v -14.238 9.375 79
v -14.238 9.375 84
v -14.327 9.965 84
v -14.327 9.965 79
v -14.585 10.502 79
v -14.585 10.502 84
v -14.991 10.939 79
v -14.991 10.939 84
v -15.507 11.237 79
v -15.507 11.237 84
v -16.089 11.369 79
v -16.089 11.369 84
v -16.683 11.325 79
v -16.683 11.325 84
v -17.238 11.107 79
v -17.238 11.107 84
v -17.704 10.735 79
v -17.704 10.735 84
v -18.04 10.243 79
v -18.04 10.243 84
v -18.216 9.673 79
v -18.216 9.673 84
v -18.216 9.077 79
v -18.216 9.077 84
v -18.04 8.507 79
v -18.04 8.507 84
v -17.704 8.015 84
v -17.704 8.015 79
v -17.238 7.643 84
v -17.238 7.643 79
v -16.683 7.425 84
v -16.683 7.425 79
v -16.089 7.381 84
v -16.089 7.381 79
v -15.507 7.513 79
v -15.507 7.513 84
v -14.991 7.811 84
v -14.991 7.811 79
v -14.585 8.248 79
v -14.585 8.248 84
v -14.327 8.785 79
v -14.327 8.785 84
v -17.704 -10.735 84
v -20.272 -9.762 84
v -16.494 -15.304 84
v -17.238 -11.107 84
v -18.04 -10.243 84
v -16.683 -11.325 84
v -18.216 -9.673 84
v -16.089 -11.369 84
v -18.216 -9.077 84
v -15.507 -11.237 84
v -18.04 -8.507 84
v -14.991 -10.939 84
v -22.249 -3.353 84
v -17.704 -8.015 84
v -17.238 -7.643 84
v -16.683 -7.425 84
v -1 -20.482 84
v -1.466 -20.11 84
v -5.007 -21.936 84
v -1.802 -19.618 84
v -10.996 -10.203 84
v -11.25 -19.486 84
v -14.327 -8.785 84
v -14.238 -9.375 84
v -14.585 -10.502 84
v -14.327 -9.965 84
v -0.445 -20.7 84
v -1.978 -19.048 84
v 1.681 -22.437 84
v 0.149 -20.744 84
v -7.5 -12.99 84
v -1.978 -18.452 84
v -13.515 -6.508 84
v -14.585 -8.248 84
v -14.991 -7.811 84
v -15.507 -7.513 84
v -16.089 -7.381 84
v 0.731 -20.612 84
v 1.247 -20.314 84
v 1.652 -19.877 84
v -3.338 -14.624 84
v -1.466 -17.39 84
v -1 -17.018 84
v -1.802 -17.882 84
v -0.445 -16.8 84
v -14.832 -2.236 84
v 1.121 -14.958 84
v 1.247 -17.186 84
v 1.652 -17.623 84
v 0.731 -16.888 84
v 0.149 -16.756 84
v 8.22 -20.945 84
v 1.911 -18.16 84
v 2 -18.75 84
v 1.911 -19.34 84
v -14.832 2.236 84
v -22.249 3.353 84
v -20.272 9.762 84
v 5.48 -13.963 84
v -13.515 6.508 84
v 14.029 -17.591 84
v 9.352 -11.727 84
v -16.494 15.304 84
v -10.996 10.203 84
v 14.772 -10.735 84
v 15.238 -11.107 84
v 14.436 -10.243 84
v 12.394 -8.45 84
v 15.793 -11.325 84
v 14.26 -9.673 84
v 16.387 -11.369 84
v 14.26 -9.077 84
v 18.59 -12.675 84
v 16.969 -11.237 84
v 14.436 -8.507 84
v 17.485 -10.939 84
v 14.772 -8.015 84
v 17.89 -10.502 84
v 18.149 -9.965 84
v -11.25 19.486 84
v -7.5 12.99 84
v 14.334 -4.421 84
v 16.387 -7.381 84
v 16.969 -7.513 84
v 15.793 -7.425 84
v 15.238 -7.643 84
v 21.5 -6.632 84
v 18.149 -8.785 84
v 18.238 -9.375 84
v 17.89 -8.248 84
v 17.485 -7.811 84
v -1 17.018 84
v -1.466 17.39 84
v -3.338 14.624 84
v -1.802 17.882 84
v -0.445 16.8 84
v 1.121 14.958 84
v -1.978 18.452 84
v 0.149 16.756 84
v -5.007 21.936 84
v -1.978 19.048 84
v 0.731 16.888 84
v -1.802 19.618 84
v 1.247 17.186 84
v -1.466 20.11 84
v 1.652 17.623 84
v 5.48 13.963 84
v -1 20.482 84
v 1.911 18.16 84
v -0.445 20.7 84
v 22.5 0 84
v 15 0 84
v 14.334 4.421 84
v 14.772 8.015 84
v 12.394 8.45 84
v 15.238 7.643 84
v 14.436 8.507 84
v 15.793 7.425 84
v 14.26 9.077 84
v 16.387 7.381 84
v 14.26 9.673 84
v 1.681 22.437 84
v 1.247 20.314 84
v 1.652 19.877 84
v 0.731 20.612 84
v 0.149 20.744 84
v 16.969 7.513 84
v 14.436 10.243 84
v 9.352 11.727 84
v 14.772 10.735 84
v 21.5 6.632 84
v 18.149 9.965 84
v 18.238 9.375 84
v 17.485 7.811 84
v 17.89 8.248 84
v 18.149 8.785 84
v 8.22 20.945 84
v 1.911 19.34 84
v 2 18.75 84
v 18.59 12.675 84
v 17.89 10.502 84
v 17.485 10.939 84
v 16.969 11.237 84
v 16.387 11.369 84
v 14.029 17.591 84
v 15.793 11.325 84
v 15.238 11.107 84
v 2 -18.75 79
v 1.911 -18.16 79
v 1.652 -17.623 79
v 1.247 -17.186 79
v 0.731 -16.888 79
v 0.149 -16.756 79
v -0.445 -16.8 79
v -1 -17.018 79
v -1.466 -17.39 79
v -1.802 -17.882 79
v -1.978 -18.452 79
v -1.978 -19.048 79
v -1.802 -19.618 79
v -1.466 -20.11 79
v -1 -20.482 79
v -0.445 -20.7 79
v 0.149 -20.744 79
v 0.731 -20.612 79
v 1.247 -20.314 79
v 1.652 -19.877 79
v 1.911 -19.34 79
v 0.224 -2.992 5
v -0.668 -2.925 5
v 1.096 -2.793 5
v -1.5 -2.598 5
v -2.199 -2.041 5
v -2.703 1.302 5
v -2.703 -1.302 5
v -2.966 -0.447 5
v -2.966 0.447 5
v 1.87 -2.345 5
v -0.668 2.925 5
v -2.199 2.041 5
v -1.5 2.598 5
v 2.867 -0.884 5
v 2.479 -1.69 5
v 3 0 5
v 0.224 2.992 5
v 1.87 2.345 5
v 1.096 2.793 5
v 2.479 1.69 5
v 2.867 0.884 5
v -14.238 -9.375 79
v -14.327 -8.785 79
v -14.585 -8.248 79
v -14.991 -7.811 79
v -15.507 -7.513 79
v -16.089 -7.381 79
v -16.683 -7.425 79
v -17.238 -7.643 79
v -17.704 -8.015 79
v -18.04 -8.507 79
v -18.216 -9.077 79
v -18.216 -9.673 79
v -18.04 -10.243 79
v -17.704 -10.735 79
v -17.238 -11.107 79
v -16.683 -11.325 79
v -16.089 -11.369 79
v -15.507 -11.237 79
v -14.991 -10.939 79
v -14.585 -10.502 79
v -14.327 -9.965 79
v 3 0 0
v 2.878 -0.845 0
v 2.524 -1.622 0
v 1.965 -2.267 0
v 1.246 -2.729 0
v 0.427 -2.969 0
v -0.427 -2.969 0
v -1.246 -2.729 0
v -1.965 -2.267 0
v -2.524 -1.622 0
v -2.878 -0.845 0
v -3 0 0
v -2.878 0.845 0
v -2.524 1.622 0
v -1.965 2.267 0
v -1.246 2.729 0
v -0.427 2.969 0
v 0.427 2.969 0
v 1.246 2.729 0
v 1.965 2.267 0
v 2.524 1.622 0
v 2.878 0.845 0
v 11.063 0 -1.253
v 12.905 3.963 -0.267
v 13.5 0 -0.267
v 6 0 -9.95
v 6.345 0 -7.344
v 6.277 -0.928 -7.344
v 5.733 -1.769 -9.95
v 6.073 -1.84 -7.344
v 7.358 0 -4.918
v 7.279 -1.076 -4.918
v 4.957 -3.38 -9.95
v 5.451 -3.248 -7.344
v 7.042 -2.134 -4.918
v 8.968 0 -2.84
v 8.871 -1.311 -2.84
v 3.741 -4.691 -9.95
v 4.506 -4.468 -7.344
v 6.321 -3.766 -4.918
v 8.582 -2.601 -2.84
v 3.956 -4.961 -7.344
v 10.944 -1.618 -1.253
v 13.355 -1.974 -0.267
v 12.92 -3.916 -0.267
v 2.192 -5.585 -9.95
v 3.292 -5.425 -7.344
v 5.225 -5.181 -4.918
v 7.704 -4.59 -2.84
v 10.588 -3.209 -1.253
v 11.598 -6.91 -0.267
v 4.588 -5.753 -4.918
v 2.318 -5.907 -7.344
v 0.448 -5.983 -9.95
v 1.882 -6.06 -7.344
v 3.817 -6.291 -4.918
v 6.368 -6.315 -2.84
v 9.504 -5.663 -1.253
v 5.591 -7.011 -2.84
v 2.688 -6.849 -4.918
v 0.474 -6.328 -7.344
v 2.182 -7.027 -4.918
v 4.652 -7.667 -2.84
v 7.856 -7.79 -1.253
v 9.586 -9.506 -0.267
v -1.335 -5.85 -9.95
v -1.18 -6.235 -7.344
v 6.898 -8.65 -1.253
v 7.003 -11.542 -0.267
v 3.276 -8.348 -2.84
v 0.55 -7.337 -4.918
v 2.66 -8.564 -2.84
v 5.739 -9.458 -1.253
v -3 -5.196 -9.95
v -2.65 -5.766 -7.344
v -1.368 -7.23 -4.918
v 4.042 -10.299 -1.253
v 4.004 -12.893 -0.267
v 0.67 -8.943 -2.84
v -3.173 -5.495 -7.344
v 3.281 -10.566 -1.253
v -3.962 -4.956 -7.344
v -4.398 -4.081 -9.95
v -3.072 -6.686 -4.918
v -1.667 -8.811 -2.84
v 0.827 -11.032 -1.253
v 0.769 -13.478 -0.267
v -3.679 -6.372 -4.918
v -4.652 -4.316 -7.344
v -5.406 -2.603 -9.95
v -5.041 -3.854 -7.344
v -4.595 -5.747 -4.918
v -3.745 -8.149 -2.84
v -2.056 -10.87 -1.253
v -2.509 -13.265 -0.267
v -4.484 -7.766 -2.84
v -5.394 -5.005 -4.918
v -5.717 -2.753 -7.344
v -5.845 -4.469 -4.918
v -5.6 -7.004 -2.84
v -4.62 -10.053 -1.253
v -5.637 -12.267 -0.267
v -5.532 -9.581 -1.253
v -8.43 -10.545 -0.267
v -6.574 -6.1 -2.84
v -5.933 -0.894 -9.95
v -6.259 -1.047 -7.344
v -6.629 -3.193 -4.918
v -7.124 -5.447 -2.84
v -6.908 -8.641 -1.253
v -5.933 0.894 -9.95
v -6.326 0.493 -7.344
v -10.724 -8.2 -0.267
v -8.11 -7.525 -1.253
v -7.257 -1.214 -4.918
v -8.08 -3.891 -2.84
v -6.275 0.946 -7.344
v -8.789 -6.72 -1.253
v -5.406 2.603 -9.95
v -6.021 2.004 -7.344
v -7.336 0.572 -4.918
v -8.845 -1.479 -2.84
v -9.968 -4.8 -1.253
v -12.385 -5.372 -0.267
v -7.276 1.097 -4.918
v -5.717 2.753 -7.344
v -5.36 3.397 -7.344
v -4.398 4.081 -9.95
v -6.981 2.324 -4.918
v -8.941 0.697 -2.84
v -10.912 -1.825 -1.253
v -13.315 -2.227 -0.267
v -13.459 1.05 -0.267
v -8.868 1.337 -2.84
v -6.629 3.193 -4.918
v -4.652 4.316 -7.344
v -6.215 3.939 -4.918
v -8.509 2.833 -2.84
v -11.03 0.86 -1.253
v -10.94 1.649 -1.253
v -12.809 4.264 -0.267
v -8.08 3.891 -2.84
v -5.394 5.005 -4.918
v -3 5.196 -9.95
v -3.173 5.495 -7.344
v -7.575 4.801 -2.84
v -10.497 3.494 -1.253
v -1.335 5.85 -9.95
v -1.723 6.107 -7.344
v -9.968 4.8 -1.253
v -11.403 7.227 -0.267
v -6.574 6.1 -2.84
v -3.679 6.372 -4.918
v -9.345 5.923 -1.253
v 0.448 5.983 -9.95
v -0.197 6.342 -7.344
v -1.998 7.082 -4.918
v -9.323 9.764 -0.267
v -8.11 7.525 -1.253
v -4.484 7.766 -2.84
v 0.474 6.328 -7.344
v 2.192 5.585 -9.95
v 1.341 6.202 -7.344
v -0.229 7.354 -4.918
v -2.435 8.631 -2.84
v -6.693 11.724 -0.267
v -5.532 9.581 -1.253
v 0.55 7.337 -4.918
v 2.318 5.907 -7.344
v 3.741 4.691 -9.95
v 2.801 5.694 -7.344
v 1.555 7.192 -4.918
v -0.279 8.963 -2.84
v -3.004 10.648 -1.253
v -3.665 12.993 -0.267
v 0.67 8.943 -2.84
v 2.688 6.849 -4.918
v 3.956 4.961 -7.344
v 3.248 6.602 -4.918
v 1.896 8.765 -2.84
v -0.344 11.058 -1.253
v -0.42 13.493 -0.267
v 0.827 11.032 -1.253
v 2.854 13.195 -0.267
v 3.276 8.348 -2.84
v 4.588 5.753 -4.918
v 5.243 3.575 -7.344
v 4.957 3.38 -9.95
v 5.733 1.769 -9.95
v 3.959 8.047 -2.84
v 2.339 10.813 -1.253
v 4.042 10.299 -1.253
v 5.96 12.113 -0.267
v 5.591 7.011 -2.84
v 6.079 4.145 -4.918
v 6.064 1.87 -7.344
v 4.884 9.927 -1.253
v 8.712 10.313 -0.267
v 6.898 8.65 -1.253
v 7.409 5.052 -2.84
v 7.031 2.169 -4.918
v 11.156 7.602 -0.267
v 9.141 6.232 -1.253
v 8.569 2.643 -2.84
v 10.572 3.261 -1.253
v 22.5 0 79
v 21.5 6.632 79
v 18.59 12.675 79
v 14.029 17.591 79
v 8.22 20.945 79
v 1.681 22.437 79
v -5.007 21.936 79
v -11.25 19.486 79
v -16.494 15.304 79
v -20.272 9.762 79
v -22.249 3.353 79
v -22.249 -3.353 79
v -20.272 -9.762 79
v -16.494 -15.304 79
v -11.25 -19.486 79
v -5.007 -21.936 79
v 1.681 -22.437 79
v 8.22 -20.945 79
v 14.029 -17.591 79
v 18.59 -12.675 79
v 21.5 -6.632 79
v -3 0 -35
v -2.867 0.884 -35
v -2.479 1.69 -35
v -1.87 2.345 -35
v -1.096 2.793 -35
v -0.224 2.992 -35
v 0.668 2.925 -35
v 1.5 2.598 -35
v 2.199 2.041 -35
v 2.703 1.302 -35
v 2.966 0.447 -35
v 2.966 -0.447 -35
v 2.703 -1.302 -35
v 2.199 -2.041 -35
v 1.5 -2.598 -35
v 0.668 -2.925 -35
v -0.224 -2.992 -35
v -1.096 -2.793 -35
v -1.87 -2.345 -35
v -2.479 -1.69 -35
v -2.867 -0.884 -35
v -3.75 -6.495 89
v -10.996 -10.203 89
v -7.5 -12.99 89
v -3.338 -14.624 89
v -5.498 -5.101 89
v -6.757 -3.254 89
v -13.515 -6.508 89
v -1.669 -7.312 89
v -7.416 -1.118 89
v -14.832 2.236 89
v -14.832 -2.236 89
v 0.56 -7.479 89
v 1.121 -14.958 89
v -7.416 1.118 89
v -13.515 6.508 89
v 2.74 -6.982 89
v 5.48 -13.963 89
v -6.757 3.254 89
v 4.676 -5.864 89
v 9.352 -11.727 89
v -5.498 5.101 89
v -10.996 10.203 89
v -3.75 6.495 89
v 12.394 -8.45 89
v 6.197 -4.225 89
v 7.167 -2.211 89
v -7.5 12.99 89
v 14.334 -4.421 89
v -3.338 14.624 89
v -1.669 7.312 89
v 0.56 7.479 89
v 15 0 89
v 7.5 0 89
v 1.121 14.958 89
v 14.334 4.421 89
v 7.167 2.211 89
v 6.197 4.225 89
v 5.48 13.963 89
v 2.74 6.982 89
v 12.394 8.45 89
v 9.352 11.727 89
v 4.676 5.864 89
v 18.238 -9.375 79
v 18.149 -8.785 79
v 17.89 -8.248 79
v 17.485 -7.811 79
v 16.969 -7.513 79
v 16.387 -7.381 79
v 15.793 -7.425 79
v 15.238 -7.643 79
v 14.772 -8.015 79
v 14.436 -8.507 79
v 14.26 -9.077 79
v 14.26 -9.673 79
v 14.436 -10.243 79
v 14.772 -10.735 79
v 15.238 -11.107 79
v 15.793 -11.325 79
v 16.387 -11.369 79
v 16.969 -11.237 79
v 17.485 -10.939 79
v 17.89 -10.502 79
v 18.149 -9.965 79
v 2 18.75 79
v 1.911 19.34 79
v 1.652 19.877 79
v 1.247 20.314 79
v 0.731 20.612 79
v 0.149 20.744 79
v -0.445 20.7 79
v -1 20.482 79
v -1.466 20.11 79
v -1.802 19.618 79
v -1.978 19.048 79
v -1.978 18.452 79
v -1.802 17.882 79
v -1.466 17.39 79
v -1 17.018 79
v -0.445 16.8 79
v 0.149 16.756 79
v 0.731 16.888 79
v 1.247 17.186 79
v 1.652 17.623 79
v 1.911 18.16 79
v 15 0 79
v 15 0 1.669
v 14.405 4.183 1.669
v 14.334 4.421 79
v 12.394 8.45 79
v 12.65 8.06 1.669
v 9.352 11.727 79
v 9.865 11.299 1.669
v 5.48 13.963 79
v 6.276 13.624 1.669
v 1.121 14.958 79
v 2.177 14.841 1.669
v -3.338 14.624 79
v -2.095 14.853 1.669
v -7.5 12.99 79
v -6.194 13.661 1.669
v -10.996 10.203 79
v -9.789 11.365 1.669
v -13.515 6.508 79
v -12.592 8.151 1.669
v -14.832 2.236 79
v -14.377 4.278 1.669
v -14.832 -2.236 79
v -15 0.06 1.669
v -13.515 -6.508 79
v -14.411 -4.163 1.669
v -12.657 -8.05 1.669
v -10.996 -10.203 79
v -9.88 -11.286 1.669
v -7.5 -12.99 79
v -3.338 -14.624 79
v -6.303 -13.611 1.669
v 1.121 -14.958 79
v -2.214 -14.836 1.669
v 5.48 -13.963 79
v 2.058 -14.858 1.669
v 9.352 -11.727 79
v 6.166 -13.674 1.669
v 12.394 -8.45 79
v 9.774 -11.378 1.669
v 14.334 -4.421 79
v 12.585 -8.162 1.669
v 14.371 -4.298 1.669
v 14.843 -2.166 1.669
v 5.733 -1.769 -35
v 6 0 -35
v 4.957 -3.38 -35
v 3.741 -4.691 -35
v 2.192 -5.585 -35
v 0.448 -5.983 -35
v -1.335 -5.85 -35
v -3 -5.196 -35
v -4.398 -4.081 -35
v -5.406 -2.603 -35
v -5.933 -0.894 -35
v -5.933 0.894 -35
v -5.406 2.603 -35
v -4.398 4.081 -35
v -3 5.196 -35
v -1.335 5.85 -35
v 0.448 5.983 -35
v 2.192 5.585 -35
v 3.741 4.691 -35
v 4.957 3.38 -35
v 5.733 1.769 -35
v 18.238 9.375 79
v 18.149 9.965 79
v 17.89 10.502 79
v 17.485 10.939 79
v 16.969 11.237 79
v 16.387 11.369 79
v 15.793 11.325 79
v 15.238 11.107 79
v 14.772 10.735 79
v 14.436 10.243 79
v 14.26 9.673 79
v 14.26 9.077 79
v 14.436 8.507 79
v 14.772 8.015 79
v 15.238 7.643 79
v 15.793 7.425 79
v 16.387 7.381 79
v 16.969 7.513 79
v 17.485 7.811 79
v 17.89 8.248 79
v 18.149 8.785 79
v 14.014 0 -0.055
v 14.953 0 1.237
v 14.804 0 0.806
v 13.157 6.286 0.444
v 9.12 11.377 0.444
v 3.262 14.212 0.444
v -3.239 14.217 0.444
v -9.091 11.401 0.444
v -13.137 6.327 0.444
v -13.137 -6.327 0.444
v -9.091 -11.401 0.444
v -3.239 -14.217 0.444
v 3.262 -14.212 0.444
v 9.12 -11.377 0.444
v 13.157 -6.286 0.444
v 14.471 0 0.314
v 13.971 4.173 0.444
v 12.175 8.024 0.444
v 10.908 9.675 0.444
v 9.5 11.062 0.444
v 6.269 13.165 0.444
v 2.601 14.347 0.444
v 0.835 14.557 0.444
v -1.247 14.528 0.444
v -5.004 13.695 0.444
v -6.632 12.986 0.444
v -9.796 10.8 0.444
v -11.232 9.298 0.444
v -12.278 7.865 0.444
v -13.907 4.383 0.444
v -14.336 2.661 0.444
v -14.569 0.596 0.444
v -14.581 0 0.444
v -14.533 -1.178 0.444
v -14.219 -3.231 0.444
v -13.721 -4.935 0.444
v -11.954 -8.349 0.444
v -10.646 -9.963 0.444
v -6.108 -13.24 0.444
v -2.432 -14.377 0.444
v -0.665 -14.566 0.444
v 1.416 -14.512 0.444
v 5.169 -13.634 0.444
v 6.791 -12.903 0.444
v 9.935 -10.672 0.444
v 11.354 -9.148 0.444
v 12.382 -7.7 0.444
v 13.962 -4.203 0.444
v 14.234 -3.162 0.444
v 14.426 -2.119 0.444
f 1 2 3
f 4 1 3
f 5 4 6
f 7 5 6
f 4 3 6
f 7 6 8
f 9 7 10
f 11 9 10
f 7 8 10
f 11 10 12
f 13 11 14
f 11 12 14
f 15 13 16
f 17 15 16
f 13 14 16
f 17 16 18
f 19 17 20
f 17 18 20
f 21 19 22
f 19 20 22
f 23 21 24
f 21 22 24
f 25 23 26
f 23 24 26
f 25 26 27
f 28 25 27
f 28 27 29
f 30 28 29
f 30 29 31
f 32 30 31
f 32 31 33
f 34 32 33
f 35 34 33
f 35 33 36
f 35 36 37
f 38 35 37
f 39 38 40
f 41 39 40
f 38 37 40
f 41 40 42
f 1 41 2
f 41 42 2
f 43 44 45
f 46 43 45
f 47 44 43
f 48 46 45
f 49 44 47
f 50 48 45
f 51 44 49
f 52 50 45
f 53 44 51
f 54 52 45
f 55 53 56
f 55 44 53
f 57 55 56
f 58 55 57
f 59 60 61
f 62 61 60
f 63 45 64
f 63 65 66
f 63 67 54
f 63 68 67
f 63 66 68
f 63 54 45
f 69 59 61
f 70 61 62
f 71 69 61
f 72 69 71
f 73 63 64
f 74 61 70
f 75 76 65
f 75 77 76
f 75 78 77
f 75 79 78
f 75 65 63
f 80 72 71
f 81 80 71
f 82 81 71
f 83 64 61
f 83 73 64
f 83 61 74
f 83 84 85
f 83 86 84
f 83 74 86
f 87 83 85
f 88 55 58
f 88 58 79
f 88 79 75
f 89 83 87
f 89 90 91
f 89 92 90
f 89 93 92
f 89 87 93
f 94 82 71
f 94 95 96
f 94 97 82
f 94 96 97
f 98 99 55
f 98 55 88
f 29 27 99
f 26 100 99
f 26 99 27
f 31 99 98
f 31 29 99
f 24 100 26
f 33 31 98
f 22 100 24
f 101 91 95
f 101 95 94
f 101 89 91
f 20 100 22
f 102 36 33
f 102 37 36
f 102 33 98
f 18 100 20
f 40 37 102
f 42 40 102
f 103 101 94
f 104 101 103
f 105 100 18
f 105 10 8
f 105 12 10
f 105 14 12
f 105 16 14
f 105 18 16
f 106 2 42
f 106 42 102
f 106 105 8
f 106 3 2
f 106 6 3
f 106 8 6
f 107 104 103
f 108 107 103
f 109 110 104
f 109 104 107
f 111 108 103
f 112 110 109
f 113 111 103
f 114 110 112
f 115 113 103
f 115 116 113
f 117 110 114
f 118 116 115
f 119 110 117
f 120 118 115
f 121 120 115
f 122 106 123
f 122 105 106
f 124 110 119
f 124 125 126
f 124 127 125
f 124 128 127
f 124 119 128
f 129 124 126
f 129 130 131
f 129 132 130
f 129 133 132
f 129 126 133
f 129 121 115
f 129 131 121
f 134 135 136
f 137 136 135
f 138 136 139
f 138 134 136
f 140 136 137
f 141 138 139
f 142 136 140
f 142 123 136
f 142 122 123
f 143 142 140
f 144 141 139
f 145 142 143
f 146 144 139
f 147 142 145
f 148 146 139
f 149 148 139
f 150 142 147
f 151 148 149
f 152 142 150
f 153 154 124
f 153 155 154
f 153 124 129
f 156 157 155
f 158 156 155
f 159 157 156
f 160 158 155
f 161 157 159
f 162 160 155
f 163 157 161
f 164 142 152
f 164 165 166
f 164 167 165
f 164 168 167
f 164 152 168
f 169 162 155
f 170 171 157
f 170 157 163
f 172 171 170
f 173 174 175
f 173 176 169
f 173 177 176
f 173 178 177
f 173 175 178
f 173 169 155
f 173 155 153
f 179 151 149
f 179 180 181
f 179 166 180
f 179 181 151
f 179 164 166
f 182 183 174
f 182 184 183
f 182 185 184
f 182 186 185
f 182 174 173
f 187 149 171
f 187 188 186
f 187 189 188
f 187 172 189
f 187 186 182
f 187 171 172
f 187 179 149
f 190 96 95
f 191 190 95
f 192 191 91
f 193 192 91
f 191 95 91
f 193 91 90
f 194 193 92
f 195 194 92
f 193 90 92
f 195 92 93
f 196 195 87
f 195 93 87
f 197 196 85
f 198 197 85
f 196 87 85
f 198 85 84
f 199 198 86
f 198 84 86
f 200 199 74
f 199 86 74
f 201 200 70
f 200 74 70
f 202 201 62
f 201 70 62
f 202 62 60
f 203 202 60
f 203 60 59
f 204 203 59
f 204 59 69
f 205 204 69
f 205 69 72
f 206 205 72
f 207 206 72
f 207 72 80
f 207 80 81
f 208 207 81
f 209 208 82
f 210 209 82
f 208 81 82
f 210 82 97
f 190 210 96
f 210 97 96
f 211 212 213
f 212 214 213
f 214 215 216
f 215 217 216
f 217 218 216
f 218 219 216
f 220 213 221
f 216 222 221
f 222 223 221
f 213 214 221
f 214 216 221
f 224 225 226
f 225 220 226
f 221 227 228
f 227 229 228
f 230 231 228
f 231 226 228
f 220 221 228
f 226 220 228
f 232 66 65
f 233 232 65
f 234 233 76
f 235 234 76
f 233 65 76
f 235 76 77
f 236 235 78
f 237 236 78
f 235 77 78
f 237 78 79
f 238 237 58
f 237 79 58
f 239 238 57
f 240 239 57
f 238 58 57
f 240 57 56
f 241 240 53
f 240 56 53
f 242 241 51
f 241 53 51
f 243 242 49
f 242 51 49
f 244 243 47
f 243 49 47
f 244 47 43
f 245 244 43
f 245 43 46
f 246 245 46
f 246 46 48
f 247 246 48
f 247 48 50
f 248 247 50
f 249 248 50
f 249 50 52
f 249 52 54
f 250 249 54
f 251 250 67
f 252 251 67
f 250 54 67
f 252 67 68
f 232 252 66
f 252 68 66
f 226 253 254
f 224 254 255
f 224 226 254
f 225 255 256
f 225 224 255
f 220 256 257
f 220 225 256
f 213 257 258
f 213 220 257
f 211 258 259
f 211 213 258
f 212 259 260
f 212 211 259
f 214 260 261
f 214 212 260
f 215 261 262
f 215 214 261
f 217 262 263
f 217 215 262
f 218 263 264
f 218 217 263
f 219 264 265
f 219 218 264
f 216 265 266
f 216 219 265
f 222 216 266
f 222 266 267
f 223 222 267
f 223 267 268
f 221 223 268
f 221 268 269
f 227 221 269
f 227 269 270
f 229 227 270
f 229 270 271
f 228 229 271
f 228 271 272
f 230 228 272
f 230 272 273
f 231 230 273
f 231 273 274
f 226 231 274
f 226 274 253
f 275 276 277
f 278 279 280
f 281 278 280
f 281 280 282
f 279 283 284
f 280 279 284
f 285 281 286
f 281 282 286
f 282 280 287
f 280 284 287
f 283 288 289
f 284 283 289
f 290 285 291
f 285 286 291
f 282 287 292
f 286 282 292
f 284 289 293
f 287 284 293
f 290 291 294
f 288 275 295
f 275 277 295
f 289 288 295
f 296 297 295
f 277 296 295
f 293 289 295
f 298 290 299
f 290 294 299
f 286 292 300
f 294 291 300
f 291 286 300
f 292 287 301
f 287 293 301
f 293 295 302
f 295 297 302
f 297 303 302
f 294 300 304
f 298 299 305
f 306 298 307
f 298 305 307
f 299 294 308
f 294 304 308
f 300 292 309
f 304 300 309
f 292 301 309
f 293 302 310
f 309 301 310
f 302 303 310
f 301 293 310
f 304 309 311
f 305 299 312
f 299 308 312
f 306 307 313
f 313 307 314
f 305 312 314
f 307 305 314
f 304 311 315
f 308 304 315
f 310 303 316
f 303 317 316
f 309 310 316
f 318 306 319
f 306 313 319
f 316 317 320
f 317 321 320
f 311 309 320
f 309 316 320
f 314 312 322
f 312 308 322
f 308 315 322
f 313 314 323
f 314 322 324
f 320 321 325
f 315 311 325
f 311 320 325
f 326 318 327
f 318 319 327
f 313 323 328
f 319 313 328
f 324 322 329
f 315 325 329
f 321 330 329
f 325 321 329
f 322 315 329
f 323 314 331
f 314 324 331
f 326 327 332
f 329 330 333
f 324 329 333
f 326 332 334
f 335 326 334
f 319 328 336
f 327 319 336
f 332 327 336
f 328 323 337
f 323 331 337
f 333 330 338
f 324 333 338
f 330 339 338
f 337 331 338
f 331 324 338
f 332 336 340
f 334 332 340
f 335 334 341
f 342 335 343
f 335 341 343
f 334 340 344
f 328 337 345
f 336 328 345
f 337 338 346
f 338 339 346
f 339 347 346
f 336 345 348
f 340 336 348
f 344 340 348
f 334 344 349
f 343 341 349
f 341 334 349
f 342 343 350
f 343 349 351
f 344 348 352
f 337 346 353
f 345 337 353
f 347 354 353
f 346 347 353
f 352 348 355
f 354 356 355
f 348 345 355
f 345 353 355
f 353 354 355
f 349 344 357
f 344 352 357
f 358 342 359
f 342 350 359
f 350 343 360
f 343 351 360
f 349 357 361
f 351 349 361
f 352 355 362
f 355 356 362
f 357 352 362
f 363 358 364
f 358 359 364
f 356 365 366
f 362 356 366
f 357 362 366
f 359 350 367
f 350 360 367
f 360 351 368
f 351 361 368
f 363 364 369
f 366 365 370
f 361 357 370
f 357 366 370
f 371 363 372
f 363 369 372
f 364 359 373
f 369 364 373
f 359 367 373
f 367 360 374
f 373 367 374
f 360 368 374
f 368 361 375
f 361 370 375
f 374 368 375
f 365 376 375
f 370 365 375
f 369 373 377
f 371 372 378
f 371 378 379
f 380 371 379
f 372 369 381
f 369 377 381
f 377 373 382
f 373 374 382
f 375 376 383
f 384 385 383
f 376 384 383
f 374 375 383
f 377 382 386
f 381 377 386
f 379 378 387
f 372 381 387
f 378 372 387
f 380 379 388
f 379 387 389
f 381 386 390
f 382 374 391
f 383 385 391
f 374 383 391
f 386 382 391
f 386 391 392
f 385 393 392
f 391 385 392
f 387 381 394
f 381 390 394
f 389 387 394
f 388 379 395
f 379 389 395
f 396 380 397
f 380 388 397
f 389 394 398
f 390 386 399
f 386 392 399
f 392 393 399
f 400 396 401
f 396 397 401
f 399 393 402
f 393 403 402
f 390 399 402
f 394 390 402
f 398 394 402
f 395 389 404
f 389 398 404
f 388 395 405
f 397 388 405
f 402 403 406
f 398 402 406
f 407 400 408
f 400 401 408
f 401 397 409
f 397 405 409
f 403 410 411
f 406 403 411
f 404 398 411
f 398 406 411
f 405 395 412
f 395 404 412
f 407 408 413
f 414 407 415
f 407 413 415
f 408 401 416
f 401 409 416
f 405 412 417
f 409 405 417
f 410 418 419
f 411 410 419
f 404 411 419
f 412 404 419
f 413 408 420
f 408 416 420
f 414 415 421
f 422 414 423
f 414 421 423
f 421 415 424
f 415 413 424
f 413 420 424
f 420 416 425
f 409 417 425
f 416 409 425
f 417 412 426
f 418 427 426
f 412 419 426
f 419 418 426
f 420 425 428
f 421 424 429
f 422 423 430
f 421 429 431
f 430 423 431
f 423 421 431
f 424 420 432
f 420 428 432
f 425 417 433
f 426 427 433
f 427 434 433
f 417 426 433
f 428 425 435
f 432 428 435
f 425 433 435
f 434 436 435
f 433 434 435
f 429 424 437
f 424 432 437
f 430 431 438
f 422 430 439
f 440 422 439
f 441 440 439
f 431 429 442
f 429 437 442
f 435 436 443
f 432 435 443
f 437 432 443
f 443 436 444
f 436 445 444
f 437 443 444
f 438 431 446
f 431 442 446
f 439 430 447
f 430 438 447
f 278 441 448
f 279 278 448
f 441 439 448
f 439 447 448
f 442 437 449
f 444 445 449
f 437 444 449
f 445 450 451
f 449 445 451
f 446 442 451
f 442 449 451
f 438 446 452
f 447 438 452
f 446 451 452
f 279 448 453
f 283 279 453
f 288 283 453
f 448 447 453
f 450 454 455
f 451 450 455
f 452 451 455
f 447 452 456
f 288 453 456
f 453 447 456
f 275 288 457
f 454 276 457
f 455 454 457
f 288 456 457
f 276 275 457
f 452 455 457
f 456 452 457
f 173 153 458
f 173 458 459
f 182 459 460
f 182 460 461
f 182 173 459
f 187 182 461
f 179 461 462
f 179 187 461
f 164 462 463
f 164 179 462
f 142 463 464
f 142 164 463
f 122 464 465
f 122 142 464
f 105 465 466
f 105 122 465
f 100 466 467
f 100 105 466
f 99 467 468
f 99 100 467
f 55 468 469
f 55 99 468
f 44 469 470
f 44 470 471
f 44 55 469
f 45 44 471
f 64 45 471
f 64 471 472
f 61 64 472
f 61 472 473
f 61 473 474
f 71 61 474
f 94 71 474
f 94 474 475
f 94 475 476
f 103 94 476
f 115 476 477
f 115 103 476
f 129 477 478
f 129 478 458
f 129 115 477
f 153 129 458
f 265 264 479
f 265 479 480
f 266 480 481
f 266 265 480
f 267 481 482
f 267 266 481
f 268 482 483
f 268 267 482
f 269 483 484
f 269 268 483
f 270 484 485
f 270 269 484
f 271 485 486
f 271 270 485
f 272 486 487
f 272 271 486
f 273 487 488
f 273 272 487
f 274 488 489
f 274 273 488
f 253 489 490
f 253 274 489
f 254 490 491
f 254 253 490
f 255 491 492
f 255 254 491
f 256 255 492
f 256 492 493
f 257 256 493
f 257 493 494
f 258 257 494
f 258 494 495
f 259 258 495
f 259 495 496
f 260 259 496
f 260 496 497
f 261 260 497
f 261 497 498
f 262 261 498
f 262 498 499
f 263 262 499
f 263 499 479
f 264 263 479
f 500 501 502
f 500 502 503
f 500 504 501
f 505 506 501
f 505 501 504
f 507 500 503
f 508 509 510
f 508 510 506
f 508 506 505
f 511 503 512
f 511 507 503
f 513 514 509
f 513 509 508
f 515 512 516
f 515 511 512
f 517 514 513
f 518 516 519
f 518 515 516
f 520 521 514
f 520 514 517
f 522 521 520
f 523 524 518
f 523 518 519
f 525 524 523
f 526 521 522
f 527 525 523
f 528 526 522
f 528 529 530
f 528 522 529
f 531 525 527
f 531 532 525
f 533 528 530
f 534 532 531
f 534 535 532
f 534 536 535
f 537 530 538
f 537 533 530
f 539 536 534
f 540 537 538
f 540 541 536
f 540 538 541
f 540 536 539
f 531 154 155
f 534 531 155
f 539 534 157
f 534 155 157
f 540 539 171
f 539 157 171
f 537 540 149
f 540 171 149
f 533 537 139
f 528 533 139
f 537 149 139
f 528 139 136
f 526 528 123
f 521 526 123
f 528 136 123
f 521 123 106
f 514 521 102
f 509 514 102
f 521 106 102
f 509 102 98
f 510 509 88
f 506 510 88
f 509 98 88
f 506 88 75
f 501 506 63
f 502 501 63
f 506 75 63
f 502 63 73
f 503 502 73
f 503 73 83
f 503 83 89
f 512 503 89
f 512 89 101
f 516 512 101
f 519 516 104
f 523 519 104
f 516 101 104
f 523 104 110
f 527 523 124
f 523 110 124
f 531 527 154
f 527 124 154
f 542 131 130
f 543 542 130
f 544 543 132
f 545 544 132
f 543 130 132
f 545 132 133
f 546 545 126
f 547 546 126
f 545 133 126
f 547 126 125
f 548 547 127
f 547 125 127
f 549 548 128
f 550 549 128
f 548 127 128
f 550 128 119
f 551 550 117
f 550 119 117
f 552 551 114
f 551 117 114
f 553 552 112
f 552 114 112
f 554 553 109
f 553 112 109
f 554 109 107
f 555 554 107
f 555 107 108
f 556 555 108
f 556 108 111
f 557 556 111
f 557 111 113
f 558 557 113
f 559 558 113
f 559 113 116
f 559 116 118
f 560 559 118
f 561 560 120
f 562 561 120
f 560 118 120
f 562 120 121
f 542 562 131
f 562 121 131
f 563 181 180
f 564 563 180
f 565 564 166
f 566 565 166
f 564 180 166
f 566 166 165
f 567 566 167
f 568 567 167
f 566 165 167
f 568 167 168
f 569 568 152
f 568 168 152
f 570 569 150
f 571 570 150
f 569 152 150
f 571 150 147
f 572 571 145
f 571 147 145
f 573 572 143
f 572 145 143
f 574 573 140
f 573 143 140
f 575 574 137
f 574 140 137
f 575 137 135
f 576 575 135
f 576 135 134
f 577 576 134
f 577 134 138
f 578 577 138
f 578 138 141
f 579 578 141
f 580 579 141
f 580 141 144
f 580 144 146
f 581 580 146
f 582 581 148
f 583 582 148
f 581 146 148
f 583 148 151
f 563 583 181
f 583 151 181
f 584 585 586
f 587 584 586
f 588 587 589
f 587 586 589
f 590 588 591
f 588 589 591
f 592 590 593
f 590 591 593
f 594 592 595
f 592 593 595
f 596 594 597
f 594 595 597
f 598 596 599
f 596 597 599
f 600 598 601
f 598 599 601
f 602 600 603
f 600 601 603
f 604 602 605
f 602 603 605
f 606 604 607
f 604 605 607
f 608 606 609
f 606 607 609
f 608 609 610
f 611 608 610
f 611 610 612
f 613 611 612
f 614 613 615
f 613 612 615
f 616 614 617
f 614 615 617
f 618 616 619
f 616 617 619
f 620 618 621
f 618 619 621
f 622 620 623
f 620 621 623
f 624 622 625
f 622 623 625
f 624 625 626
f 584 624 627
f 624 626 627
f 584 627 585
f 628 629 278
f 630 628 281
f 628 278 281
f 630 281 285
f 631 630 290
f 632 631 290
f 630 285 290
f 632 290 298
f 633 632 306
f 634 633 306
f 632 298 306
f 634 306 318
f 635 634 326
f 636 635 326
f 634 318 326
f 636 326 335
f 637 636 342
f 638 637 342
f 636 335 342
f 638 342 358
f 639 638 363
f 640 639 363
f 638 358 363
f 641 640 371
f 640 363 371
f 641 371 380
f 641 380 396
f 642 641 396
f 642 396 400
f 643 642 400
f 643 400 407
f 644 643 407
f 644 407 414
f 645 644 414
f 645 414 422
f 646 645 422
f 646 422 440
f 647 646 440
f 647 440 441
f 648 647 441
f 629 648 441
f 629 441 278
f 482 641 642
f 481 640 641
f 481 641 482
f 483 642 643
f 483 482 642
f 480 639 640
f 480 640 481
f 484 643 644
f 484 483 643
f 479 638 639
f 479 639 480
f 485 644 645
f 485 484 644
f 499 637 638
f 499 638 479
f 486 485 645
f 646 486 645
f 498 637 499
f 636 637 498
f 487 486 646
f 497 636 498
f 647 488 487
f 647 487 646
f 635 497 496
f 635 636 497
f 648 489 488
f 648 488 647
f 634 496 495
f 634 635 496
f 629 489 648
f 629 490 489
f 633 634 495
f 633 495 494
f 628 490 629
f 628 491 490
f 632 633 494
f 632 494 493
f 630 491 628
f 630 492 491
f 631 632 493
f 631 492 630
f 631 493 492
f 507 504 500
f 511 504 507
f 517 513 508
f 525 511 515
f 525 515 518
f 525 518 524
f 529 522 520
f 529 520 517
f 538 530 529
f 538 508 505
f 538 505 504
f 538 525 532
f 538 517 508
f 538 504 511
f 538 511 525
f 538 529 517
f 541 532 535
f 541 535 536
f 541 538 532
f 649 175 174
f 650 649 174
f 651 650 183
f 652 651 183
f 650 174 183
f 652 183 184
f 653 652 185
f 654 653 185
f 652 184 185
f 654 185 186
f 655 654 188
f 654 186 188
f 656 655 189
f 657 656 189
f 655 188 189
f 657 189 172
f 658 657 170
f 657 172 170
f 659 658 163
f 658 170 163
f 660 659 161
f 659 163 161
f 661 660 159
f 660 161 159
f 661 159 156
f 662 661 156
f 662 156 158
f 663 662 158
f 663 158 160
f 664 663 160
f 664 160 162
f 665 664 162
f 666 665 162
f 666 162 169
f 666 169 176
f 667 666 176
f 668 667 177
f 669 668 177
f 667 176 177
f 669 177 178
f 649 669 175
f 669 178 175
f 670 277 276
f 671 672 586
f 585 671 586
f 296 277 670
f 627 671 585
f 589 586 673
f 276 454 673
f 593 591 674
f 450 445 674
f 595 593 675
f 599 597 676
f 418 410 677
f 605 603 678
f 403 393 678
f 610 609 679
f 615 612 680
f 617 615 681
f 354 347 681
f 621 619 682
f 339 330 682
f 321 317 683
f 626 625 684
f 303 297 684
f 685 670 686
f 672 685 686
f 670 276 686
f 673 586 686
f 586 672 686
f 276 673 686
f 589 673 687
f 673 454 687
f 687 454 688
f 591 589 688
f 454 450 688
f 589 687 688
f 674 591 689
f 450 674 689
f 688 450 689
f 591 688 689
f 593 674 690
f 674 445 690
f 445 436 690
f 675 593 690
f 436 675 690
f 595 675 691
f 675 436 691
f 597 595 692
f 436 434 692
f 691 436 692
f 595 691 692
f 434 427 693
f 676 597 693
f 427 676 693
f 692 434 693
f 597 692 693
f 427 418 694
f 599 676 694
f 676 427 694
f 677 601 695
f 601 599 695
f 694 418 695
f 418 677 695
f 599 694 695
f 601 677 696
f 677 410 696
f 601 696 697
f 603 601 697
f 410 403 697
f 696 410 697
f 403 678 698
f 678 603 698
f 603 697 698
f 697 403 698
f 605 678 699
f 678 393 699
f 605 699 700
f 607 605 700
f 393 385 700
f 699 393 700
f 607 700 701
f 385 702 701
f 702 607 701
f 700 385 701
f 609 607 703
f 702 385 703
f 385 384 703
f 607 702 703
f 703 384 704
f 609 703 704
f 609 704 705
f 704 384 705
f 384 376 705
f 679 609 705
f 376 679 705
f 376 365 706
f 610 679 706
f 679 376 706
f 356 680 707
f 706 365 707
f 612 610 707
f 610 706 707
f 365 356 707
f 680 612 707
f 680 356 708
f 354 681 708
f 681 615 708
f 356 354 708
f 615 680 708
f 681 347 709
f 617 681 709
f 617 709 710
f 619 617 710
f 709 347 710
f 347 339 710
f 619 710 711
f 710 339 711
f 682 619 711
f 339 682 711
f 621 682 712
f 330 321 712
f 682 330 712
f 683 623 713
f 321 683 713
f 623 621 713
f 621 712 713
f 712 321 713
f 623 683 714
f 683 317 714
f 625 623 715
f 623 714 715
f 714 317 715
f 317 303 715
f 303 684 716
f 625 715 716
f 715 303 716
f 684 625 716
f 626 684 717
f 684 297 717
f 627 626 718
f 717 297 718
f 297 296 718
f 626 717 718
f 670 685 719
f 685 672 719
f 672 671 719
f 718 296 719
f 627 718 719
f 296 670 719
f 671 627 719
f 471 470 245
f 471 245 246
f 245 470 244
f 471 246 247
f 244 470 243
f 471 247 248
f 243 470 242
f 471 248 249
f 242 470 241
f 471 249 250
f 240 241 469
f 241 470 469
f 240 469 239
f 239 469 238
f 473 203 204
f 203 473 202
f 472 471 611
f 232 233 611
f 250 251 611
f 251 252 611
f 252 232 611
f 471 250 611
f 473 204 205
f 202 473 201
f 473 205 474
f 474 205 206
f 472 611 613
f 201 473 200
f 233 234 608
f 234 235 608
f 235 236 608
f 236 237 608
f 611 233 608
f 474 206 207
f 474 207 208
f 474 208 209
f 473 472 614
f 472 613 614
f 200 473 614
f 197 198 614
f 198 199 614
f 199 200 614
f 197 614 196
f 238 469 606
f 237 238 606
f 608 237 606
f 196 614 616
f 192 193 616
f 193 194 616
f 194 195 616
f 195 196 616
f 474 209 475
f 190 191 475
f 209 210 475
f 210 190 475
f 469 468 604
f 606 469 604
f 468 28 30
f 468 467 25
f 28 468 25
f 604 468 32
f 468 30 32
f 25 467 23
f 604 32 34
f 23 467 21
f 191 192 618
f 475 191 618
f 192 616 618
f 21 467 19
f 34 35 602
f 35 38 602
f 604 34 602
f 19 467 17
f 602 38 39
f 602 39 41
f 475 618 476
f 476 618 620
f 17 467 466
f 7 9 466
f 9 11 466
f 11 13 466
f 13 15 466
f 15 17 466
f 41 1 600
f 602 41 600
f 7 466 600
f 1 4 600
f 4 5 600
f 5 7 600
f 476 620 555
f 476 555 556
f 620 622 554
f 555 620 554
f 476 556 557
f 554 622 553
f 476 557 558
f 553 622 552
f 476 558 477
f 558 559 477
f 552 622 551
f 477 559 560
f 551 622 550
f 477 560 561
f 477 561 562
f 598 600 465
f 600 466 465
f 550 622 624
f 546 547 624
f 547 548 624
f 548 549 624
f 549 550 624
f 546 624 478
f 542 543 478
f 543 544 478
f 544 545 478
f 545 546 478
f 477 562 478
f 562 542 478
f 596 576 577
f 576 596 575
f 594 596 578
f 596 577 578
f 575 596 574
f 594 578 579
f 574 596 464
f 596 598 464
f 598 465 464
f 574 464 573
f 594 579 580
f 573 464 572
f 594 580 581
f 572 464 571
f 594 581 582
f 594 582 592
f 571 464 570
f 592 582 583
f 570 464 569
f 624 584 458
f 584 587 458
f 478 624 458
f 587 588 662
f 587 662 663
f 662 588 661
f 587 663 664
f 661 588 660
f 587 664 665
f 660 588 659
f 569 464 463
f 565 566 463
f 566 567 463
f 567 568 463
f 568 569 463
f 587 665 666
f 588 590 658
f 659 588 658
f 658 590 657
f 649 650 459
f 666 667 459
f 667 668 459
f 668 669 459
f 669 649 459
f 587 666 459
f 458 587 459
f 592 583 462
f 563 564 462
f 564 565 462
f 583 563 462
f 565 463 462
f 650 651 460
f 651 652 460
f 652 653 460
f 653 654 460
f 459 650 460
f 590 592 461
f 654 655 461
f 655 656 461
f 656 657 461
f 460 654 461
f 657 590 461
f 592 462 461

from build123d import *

# Parameters (mm, degrees)
SKETCH1_R           = 15
BOSS_EXTRUDE1_DEPTH = 72
SKETCH3_R           = 15
SKETCH3_R_2         = 7.5
BOSS_EXTRUDE2_DEPTH = 17
BOSS_EXTRUDE3_START = -5
SKETCH4_R           = 22.5
SKETCH4_R_2         = 12.5
SKETCH4_R_3         = 2
BOSS_EXTRUDE3_DEPTH = 5
SKETCH6_R           = 6
SKETCH6_R_2         = 3
BOSS_EXTRUDE4_DEPTH = 35
CUT_EXTRUDE2_START  = -67
SKETCH9_R           = 7.5
CUT_EXTRUDE2_DEPTH  = 67
CUT_EXTRUDE3_START  = -5
SKETCH10_R          = 3
CUT_EXTRUDE3_DEPTH  = 5
FILLET1_R           = 10
FILLET2_R           = 2
BOSS_EXTRUDE5_START = -84
SKETCH12_R          = 7.5
BOSS_EXTRUDE5_DEPTH = 84


with BuildPart() as part:
    # Sketch1 → Boss-Extrude1 (new body)
    with BuildSketch(Plane.XY):
        Circle(SKETCH1_R)
    extrude(amount=BOSS_EXTRUDE1_DEPTH)

    # Sketch3 → Boss-Extrude2 (add)
    with BuildSketch(Plane.XY.offset(72)):
        Circle(SKETCH3_R)
        Circle(SKETCH3_R_2, mode=Mode.SUBTRACT)
    extrude(amount=BOSS_EXTRUDE2_DEPTH)

    # Sketch4 → Boss-Extrude3 (add)
    with BuildSketch(Plane.XY.offset(89).offset(BOSS_EXTRUDE3_START)):
        Circle(SKETCH4_R)
        Circle(SKETCH4_R_2, mode=Mode.SUBTRACT)
        with Locations((0, 18.75)):
            Circle(SKETCH4_R_3, mode=Mode.SUBTRACT)
        with Locations((16.237976321, 9.375)):
            Circle(SKETCH4_R_3, mode=Mode.SUBTRACT)
        with Locations((16.237976321, -9.375)):
            Circle(SKETCH4_R_3, mode=Mode.SUBTRACT)
        with Locations((0, -18.75)):
            Circle(SKETCH4_R_3, mode=Mode.SUBTRACT)
        with Locations((-16.237976321, -9.375)):
            Circle(SKETCH4_R_3, mode=Mode.SUBTRACT)
        with Locations((-16.237976321, 9.375)):
            Circle(SKETCH4_R_3, mode=Mode.SUBTRACT)
    extrude(amount=-BOSS_EXTRUDE3_DEPTH)

    # Sketch6 → Boss-Extrude4 (add)
    with BuildSketch(Plane(origin=(0, 0, 0), x_dir=(-1, 0, 0), z_dir=(0, 0, -1))):
        with Locations(Location((0, 0, 0), (0, 0, 180))):
            Circle(SKETCH6_R)
        Circle(SKETCH6_R_2, mode=Mode.SUBTRACT)
    extrude(amount=BOSS_EXTRUDE4_DEPTH)

    # Sketch9 → Cut-Extrude2 (cut)
    with BuildSketch(Plane.XY.offset(72).offset(CUT_EXTRUDE2_START)):
        Circle(SKETCH9_R)
    extrude(amount=CUT_EXTRUDE2_DEPTH, mode=Mode.SUBTRACT)

    # Sketch10 → Cut-Extrude3 (cut)
    with BuildSketch(Plane(origin=(0, 0, 0), x_dir=(-1, 0, 0), z_dir=(0, 0, -1)).offset(CUT_EXTRUDE3_START)):
        with Locations(Location((0, 0, 0), (0, 0, 180))):
            Circle(SKETCH10_R)
    extrude(amount=CUT_EXTRUDE3_DEPTH, mode=Mode.SUBTRACT)

    # Fillet1
    # the kernel refuses this fillet: 10 mm, written as the material it adds along each edge
    with BuildSketch(Plane(origin=(0, 0, 0), x_dir=(1, 0, 0), z_dir=(0, 1, 0))) as fillet1_piece_1:
        with BuildLine():
            CenterArc((16, 9.949874371), FILLET1_R, 180, 84.260829523)
            Line((6, 9.949874371), (5.8, 9.949874371))
            Line((5.8, 9.949874371), (5.8, 0))
            Line((5.8, 0), (6, -0.2))
            ThreePointArc((6, -0.2), (10.5, -0.2), (14.98, -0.198997487))
            Line((14.98, -0.198997487), (15, 0))
        make_face()
    revolve(axis=Axis((0, 0, 0), (0, 0, -1)))

    # Fillet2
    fillet2_edges = [part.edges().sort_by_distance(p)[0] for p in [
        (-15, 0, 0),
    ]]
    fillet(fillet2_edges, radius=FILLET2_R)

    # Sketch12 → Boss-Extrude5 (add)
    with BuildSketch(Plane.XY.offset(89).offset(BOSS_EXTRUDE5_START)):
        Circle(SKETCH12_R)
    extrude(amount=BOSS_EXTRUDE5_DEPTH)


solid = part.part
